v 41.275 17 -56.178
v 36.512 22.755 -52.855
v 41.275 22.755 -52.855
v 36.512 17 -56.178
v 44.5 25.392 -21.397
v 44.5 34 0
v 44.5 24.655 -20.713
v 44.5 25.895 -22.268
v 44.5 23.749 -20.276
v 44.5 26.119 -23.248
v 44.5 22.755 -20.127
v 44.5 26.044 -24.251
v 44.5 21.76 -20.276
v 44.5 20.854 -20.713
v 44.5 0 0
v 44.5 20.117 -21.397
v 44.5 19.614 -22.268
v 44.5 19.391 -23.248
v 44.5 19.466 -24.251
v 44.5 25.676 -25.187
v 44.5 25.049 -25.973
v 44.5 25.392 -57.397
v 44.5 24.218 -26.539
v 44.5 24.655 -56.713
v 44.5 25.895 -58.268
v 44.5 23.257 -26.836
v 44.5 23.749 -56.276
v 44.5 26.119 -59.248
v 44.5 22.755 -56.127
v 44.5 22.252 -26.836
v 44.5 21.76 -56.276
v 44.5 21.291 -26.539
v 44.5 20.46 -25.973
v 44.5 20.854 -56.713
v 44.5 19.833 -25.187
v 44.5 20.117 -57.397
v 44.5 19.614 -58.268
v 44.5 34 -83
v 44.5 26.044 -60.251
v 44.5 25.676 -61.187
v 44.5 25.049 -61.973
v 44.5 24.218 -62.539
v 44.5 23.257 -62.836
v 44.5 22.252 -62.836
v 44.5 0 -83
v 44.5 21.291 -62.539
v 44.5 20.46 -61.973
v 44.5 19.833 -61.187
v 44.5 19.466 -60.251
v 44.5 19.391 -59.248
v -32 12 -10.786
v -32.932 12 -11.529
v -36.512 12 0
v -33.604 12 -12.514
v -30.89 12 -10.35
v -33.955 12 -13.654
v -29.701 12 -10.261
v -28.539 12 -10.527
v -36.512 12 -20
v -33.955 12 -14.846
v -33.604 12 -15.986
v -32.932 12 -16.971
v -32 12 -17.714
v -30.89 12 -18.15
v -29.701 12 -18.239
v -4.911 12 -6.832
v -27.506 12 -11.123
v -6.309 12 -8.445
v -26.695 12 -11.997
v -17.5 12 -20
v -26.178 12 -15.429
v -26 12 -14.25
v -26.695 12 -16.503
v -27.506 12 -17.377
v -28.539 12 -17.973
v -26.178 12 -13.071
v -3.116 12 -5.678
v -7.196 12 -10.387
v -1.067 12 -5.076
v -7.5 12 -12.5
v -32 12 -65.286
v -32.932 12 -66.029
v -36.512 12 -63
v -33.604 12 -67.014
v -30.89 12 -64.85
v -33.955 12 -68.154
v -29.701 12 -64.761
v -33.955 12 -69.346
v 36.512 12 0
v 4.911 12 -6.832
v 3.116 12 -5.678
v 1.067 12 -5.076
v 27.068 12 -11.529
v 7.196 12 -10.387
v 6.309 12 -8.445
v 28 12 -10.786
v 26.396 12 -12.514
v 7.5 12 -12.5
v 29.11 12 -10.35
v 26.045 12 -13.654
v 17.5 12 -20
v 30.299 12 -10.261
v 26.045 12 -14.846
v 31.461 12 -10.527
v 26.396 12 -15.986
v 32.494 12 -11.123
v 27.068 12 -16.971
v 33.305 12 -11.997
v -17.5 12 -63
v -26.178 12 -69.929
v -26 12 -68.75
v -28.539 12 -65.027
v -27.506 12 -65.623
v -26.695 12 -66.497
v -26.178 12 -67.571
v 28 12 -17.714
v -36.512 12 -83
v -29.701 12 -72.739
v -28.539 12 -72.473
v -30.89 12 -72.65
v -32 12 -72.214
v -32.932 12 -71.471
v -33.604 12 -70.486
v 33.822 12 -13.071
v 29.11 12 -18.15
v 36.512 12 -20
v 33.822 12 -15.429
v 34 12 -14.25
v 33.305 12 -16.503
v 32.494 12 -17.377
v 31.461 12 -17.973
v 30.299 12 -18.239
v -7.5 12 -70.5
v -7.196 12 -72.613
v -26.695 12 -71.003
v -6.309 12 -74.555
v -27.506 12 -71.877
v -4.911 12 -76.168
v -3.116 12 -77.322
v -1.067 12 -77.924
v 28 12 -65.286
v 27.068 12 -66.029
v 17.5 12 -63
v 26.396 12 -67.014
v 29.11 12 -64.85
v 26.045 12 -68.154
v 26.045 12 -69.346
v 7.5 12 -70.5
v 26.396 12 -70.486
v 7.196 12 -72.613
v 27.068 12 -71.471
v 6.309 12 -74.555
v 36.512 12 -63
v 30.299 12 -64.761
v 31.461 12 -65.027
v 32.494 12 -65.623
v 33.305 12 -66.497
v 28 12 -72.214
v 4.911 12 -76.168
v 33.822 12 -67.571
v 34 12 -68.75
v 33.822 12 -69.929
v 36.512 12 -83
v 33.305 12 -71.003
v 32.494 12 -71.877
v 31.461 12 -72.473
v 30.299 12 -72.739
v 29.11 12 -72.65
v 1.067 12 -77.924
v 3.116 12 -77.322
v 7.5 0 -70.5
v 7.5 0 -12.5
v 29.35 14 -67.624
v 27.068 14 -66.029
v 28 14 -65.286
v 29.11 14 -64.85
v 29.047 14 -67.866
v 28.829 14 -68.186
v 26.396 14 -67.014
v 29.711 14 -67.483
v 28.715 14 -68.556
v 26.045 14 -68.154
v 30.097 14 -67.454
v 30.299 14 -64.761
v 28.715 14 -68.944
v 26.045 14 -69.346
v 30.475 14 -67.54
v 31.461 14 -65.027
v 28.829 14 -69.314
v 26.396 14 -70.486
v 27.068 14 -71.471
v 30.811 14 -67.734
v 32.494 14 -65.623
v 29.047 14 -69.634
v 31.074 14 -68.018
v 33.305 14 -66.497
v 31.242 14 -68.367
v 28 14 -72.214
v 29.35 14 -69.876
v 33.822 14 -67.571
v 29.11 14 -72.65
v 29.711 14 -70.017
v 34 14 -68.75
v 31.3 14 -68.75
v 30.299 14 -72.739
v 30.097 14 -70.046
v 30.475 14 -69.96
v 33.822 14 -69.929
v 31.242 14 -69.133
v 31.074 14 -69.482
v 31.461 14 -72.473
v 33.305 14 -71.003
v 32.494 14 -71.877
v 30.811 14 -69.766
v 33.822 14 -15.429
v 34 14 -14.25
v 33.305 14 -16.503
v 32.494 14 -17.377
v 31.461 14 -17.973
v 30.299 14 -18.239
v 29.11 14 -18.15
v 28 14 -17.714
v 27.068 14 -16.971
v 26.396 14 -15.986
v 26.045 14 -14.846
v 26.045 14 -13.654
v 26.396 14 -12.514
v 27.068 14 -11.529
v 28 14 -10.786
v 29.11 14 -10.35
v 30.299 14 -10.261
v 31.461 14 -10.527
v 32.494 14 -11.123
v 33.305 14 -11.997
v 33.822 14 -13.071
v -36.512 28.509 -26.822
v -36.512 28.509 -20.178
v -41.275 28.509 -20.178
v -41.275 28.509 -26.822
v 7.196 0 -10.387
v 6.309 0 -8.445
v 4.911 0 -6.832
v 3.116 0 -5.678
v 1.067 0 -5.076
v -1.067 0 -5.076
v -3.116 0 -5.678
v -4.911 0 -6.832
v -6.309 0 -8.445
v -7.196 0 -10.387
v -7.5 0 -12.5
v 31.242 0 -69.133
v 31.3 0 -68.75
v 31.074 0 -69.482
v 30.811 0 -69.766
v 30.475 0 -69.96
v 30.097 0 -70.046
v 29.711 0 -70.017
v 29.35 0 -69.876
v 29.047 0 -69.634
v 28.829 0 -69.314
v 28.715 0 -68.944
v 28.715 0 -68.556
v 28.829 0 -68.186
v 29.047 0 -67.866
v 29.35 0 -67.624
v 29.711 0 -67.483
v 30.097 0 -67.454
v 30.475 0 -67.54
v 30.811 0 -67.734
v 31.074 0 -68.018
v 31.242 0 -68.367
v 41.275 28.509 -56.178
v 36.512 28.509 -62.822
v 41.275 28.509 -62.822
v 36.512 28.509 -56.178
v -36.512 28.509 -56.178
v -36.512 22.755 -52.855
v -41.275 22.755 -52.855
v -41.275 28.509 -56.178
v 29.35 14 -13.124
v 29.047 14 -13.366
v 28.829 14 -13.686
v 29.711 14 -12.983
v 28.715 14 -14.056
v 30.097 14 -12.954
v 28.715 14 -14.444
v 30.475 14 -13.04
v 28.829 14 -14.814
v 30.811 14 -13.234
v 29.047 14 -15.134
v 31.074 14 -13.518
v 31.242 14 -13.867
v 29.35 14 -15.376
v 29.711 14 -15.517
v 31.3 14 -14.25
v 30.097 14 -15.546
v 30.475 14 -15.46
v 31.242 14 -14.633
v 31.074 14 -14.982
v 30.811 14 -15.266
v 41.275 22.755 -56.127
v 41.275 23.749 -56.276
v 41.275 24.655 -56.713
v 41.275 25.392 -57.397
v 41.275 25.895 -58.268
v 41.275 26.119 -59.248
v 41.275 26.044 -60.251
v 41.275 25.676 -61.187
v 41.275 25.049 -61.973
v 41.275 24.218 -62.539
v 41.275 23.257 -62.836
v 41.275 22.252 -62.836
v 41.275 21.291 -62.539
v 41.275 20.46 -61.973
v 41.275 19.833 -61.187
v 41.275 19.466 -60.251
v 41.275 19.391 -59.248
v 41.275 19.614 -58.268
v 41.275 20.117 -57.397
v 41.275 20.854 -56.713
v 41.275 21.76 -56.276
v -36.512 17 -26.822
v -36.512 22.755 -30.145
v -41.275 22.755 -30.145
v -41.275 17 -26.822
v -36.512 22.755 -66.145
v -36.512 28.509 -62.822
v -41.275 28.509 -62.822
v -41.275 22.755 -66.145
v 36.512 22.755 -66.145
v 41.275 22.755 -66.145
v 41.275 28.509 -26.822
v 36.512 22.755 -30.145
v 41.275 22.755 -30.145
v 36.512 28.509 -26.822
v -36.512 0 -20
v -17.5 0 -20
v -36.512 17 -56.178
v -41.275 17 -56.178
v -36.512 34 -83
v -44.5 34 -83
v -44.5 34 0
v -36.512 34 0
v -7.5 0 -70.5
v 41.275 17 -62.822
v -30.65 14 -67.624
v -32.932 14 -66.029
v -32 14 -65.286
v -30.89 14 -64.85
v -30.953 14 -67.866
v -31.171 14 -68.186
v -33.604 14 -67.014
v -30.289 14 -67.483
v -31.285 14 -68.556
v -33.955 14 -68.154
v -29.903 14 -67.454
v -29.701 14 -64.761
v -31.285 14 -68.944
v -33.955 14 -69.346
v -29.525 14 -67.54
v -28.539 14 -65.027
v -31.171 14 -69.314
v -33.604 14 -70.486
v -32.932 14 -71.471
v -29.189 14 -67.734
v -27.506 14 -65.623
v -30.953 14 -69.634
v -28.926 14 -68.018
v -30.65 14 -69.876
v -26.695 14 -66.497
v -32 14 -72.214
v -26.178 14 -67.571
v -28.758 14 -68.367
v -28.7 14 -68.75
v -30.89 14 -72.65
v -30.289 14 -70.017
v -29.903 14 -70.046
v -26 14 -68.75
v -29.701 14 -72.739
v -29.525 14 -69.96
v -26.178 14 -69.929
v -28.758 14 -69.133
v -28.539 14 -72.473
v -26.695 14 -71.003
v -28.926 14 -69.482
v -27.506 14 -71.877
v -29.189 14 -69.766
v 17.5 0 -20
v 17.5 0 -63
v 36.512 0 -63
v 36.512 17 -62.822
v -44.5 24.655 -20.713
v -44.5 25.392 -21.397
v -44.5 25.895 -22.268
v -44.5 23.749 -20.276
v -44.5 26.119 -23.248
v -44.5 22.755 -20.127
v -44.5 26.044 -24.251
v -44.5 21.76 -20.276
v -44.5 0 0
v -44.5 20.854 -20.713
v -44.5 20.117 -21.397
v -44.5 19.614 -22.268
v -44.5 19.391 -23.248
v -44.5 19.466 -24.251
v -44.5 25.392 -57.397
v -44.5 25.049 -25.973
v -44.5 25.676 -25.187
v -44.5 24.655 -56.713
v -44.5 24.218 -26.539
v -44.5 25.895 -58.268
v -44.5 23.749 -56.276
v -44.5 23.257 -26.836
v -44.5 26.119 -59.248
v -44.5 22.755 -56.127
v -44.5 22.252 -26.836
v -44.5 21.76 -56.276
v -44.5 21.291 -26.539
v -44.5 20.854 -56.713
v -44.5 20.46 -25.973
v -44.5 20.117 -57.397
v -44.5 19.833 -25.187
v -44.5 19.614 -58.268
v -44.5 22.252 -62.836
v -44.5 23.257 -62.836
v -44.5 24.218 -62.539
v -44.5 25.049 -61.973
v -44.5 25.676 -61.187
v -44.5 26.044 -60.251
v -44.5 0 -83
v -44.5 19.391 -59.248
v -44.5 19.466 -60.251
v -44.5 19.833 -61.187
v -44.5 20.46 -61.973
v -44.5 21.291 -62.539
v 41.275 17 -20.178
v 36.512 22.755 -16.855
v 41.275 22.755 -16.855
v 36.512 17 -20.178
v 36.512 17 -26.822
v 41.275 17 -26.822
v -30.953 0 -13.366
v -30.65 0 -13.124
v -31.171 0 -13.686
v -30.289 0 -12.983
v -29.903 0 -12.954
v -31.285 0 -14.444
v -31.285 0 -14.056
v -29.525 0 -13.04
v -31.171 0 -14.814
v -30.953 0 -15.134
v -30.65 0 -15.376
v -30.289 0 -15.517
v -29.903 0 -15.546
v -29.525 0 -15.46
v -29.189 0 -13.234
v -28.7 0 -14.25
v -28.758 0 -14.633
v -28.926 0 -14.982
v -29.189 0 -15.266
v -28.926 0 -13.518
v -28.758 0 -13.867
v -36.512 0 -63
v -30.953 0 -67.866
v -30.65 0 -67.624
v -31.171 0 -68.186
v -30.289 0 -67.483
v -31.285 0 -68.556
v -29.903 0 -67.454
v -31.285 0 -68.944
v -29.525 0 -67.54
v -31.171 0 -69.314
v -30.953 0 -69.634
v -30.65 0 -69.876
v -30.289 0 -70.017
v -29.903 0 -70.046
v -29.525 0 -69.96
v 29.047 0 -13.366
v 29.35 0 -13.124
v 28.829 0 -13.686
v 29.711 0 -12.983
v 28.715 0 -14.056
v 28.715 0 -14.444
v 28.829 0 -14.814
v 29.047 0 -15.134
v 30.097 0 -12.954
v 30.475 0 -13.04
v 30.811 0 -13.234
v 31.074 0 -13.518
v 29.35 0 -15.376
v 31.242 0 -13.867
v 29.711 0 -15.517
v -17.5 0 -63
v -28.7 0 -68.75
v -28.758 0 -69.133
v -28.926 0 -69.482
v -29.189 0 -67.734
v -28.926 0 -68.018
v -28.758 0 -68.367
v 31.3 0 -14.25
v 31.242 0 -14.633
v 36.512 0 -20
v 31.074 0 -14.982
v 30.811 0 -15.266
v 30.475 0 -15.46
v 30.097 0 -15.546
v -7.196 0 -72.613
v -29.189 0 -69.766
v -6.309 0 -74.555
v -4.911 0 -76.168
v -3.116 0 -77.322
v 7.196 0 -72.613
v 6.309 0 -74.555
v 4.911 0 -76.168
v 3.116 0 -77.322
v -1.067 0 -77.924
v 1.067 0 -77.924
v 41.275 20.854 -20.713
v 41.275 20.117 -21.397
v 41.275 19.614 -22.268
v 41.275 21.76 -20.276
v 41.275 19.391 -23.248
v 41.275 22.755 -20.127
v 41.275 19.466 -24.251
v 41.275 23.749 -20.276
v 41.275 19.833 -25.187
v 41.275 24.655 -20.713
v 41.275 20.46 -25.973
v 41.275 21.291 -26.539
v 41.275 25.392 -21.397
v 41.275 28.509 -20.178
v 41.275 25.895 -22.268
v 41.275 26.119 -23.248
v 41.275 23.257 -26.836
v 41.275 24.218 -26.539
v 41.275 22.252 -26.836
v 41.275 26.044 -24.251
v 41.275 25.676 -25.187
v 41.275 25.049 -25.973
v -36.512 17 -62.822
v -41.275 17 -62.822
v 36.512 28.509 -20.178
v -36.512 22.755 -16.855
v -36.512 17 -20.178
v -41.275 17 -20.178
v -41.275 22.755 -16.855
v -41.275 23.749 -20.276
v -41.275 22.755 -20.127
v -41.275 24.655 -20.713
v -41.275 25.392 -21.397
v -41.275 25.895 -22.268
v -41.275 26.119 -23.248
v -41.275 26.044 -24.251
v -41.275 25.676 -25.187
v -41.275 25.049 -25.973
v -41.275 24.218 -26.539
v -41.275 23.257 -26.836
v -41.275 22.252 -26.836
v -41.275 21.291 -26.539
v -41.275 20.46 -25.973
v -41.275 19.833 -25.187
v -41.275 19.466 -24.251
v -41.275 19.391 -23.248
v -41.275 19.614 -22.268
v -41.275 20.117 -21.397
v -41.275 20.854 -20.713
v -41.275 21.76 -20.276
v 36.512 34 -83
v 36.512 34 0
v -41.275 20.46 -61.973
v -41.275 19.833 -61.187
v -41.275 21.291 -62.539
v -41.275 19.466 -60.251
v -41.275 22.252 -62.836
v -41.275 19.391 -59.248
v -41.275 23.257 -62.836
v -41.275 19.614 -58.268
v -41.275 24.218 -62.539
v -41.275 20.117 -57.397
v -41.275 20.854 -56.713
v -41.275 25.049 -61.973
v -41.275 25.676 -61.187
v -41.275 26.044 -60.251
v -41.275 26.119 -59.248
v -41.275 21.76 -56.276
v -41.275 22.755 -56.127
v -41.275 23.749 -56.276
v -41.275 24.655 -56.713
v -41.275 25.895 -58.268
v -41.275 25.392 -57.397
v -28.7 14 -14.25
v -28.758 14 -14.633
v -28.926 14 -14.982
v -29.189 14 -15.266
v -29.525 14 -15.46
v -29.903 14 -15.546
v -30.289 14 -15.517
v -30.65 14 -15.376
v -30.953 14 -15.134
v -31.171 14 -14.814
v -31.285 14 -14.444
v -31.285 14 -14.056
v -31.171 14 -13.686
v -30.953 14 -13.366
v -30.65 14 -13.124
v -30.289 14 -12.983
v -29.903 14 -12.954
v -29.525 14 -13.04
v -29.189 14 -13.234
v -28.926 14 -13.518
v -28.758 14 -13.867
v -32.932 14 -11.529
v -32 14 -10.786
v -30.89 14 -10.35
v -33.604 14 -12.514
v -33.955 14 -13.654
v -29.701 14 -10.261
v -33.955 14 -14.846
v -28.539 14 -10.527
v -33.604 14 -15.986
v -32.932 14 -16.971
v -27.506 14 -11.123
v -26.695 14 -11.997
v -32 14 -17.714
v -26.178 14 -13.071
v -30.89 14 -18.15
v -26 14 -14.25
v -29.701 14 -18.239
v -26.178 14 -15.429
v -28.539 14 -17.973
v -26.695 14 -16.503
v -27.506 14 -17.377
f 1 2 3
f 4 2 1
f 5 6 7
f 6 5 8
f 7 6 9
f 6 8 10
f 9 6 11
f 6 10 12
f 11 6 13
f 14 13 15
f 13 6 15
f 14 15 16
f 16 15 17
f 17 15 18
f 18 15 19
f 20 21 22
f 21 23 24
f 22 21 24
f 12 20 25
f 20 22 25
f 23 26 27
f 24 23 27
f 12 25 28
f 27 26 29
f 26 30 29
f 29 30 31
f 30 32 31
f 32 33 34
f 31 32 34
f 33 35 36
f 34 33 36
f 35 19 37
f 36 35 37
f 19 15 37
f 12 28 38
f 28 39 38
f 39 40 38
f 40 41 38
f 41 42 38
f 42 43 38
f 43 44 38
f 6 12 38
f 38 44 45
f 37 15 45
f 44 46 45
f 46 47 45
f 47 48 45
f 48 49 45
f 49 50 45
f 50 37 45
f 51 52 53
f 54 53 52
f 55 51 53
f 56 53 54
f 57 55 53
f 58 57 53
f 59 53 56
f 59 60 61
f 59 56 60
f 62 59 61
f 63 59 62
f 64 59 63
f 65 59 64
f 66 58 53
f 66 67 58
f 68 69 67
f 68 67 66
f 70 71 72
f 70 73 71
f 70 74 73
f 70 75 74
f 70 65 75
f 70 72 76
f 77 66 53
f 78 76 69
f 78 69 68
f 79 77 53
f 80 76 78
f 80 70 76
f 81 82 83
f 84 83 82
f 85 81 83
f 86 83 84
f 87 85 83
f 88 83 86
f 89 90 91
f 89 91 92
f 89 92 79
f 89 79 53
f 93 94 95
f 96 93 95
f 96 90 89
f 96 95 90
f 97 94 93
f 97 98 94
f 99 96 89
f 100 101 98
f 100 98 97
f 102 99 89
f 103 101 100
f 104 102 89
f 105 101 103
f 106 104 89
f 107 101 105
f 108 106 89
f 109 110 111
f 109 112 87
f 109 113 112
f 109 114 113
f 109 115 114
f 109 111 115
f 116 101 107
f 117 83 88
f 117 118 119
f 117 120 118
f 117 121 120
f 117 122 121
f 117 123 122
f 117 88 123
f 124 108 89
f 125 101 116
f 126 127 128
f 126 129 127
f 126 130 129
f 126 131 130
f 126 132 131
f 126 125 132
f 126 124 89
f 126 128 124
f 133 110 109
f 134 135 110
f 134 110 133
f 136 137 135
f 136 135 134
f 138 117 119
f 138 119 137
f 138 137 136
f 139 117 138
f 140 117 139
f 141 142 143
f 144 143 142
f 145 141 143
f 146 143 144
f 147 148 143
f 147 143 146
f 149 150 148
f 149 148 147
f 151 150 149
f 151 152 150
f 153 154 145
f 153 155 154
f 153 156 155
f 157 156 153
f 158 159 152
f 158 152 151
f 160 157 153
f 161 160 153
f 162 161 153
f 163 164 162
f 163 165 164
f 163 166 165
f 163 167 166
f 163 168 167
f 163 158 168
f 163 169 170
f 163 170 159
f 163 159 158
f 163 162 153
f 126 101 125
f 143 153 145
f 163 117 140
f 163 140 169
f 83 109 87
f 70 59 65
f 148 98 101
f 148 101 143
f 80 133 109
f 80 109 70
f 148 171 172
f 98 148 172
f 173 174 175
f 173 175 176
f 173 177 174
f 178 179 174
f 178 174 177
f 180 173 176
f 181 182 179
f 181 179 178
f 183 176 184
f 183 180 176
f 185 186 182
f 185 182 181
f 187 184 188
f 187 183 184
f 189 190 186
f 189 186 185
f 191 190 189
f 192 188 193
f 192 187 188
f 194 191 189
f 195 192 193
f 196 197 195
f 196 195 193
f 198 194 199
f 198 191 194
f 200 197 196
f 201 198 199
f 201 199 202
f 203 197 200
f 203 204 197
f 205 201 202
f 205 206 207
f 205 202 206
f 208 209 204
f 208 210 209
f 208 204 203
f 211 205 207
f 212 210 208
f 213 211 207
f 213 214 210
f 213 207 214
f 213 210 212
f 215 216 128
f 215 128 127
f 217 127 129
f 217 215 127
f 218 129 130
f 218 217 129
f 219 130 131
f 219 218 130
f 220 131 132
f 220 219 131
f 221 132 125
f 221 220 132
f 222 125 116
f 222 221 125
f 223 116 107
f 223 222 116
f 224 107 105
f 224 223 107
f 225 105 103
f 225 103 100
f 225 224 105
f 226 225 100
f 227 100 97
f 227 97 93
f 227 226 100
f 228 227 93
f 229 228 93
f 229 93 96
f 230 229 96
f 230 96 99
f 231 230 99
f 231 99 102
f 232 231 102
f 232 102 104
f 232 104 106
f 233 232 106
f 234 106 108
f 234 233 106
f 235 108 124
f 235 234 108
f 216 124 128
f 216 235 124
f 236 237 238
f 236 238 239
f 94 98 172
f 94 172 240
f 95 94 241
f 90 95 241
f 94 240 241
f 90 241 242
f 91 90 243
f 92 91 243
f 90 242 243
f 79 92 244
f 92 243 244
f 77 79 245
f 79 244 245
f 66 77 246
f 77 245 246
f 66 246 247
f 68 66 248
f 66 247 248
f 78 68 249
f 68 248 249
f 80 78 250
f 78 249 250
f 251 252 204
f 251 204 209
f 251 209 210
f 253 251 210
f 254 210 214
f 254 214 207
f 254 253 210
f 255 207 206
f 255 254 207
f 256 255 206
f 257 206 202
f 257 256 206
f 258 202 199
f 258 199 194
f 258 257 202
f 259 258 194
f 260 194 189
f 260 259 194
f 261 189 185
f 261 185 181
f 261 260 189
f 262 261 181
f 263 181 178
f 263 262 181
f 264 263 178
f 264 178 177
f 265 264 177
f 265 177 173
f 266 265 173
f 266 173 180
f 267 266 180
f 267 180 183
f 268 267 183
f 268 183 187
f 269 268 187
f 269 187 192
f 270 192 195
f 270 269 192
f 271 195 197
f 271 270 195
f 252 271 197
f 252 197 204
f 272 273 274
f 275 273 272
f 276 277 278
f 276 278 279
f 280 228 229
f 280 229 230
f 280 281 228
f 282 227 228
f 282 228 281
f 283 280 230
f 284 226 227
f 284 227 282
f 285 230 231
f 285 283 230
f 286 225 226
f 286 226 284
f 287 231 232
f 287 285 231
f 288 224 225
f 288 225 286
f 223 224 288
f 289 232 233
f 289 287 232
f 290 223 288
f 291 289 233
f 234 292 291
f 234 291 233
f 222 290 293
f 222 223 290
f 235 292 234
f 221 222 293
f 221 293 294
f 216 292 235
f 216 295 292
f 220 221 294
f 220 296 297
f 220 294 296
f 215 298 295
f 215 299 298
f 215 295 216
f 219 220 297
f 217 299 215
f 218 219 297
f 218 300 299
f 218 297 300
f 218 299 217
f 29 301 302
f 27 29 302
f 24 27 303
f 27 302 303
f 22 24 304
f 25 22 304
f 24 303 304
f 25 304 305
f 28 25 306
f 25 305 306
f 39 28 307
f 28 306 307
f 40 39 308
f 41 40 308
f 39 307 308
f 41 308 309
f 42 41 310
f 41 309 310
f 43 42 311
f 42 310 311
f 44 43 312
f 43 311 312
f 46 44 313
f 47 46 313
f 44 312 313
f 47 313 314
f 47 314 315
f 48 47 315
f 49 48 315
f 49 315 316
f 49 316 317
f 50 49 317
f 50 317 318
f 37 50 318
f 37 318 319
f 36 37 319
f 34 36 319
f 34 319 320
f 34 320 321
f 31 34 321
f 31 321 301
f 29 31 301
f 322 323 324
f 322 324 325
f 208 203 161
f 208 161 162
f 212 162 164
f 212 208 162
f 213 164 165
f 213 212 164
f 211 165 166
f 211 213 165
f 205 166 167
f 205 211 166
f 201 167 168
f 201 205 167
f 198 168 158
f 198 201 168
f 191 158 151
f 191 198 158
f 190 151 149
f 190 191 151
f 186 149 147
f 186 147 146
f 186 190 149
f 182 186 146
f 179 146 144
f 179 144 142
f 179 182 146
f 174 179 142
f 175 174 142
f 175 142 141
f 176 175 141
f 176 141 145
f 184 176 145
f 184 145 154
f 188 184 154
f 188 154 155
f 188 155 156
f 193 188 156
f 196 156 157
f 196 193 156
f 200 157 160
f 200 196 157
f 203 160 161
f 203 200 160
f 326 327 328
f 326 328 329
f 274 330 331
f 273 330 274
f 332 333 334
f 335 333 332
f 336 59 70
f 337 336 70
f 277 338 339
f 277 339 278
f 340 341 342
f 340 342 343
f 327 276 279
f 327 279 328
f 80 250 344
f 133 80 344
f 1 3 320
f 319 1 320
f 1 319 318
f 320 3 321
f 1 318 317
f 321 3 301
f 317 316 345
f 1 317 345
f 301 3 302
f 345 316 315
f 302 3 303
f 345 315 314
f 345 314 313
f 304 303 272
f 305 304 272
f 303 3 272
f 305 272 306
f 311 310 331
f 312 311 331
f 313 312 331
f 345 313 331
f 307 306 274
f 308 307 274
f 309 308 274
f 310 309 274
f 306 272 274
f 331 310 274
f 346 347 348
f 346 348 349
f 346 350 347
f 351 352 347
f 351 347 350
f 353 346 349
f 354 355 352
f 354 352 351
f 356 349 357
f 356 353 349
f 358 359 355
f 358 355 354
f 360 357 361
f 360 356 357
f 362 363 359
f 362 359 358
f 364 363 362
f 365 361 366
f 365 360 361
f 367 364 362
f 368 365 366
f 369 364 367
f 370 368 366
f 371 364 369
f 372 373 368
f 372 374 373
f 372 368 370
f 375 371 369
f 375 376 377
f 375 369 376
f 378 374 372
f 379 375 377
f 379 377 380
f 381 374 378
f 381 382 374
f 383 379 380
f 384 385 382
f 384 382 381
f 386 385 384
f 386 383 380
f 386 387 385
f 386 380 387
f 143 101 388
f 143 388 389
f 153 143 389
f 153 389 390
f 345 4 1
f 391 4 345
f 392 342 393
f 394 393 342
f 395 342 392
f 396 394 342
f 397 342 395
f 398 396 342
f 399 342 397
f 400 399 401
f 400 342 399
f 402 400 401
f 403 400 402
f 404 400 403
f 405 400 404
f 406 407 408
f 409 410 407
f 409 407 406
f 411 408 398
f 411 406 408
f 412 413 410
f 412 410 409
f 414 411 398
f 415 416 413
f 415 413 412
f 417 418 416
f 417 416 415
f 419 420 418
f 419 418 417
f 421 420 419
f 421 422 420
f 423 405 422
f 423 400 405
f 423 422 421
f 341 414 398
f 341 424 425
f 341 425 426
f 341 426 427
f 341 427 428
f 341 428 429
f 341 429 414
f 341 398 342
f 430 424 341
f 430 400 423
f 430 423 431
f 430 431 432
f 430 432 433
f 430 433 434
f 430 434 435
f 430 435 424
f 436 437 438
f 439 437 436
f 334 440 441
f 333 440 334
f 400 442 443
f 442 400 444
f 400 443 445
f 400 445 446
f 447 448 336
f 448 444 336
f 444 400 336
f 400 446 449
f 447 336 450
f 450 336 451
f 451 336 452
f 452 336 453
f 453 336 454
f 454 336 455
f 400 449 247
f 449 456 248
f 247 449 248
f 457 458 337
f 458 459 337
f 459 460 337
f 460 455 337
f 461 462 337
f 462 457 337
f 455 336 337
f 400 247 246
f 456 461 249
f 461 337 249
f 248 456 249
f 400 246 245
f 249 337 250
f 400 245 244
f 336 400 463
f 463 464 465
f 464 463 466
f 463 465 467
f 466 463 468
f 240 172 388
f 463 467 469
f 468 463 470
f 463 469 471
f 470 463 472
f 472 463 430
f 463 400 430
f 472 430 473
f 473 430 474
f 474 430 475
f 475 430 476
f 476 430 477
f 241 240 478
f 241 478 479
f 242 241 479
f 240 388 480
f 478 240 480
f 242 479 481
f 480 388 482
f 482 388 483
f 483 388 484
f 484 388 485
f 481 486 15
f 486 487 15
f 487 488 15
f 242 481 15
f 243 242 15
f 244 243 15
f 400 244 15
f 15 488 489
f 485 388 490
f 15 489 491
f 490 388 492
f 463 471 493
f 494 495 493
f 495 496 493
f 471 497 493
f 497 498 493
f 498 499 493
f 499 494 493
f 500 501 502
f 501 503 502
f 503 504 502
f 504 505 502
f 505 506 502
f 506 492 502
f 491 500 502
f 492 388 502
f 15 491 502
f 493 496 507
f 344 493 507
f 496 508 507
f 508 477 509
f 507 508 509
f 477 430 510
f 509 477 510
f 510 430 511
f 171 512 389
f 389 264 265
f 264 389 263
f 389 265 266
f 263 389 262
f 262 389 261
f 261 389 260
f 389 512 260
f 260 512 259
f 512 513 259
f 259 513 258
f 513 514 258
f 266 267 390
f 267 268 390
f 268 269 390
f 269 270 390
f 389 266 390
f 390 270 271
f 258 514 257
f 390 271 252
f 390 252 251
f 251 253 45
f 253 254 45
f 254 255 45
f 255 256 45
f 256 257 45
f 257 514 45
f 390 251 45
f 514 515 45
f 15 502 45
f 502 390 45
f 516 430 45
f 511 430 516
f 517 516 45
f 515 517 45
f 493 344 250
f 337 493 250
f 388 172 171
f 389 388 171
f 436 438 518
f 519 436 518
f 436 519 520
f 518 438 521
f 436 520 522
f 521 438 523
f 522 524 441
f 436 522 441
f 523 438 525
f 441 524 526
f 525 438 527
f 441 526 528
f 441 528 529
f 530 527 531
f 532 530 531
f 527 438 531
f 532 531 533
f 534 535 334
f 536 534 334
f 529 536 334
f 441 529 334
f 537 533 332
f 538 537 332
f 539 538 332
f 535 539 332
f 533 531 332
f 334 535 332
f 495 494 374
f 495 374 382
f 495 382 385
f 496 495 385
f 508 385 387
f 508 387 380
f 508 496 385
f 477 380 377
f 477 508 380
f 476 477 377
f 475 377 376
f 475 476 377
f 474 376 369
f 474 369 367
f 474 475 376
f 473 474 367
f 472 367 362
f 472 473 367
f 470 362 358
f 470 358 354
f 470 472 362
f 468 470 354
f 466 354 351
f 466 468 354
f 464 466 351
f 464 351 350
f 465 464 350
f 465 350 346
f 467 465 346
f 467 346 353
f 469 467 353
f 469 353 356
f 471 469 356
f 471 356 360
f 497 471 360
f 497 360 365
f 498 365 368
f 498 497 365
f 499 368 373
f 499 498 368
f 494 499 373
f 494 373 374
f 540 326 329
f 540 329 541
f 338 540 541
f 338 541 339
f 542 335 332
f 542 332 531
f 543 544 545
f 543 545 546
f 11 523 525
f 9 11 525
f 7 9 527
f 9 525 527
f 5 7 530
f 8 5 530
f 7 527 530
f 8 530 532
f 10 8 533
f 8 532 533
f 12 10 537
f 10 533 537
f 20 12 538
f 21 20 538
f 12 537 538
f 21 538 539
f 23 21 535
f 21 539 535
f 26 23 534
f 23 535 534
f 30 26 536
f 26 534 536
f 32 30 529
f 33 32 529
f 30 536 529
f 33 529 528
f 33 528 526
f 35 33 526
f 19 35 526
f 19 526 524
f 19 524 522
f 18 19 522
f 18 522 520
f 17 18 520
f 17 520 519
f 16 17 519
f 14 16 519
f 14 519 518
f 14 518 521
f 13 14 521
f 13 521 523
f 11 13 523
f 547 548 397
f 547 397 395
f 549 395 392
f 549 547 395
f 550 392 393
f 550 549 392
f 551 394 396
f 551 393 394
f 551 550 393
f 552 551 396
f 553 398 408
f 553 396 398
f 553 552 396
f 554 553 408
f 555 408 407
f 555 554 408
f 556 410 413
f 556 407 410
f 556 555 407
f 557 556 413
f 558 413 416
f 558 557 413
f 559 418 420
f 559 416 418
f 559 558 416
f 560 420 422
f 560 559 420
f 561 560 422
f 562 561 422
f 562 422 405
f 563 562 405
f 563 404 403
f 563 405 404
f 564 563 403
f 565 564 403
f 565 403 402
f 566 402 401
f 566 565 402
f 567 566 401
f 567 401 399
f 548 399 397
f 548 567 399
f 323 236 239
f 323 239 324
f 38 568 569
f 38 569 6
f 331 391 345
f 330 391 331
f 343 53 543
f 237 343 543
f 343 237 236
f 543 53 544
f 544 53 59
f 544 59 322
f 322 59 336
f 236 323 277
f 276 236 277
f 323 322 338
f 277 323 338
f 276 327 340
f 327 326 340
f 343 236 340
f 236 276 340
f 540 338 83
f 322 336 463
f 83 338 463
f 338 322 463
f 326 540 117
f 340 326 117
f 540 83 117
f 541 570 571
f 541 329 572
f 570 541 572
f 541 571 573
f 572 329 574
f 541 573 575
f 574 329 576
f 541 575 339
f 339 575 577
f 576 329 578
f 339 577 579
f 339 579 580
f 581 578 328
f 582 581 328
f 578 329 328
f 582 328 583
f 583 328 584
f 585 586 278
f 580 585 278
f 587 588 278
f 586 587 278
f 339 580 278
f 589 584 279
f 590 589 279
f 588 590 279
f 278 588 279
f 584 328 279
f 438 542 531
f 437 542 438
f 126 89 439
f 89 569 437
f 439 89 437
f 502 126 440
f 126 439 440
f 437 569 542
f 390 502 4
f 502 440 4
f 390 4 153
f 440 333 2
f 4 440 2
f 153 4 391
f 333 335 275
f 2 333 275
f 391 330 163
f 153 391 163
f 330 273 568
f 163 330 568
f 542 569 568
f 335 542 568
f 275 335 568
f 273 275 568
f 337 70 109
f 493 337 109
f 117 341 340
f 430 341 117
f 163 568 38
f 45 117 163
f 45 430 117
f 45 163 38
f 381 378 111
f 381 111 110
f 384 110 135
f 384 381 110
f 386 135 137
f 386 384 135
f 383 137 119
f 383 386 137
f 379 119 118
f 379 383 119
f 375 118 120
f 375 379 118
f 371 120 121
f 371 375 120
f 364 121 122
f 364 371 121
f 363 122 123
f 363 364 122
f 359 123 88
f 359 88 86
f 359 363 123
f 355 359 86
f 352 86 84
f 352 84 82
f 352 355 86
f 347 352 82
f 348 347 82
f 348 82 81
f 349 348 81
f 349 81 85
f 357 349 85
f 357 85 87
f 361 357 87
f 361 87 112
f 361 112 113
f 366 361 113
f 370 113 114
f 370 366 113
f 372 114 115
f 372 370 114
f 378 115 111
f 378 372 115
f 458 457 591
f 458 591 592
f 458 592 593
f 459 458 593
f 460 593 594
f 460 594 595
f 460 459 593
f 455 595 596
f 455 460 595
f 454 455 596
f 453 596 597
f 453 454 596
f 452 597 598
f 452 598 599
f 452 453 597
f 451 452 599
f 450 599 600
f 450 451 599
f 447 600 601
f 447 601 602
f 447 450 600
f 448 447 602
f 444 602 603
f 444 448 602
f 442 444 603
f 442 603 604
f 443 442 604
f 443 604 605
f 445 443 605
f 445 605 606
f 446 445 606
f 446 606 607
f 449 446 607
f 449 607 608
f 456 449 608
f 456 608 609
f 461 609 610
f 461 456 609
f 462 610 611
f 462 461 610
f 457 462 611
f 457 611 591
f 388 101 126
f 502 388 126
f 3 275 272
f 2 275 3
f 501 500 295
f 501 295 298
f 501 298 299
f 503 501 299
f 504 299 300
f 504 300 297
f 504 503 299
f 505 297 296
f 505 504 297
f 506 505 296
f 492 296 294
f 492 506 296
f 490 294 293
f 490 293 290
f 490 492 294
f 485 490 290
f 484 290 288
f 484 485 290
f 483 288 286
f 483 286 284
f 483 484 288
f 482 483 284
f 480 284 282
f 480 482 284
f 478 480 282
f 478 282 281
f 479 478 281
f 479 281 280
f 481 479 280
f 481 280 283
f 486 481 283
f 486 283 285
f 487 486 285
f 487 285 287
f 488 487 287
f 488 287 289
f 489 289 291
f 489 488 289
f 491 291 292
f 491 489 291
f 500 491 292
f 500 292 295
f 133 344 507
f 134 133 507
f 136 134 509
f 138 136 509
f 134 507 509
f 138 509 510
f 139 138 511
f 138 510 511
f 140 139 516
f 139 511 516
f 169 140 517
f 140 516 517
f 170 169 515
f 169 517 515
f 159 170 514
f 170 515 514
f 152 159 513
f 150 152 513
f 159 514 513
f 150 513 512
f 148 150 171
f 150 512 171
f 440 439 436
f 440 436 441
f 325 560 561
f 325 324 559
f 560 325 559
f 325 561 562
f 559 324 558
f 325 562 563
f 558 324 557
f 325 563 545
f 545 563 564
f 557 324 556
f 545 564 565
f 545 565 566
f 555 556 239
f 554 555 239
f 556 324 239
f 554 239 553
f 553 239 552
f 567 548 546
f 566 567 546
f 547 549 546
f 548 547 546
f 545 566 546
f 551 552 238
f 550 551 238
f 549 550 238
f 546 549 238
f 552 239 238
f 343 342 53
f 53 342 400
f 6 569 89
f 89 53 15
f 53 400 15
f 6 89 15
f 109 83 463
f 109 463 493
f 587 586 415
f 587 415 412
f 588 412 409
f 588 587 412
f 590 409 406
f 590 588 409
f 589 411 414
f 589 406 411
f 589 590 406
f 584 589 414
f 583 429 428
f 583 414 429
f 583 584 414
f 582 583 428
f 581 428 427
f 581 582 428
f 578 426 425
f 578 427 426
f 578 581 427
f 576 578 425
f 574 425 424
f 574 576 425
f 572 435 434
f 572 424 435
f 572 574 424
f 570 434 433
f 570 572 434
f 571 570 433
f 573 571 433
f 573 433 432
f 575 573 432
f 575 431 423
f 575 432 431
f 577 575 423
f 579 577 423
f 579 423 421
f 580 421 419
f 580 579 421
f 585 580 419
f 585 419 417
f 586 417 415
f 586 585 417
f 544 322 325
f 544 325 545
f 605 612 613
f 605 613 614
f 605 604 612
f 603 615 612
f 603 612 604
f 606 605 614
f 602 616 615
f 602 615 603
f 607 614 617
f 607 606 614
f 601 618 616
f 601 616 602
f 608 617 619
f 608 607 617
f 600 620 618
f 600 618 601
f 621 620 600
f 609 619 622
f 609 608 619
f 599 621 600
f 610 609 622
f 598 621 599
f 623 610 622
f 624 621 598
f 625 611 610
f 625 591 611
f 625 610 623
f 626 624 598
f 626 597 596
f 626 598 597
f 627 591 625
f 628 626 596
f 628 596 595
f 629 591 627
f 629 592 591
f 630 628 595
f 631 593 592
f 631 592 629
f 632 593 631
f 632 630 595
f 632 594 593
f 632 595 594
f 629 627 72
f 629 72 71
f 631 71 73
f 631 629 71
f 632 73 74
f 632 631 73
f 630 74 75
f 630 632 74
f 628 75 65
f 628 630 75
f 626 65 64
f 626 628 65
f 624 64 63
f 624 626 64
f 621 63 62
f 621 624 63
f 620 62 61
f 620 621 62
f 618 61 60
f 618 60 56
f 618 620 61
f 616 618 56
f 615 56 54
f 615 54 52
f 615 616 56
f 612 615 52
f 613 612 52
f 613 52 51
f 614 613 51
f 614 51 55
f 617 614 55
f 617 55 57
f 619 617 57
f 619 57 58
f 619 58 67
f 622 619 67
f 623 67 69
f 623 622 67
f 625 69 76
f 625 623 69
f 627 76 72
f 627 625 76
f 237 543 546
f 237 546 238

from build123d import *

# Parameters (mm, degrees)
SKETCH1_W                   = 89
SKETCH1_H                   = 83
SKETCH1_R                   = 1.3
MAIN_BODY_DEPTH             = 14
SKETCH2_W                   = 73.025
SKETCH2_H                   = 83
SKETCH2_R                   = 4
SCREW_RISER_DEPTH           = 2
SKETCH4_W                   = 7.9875
SKETCH4_H                   = 83
TOPPER_SUPPORT_DEPTH        = 20
MOUNT_START                 = -44.5
MOUNT_NUTS_DEPTH            = 41.275
F_9_32_MOUNT_HOLES_REACH    = 9.988
SKETCH5_R                   = 3.3734375
SKETCH8_W                   = 19.0125
SKETCH8_H                   = 43
MIDDLE_CUT_DEPTH            = 14
SKETCH9_R                   = 3.3734375
MOUNT_NUTS_P2_DEPTH         = 4.7625
SKETCH9_3_R                 = 3.3734375
F_9_32_MOUNT_HOLES_P2_DEPTH = 7.9875


with BuildPart() as part:
    # Sketch1 → Main Body (new body)
    with BuildSketch(Plane(origin=(0, 0, 0), x_dir=(1, 0, 0), z_dir=(0, 1, 0))):
        with Locations((0, 41.5)):
            Rectangle(SKETCH1_W, SKETCH1_H)
        with Locations((-30, 14.25)):
            Circle(SKETCH1_R, mode=Mode.SUBTRACT)
        with Locations((30, 14.25)):
            Circle(SKETCH1_R, mode=Mode.SUBTRACT)
        with BuildLine():
            Line((-7.5, 12.5), (-7.5, 70.5))
            ThreePointArc((-7.5, 70.5), (0, 78), (7.5, 70.5))
            Line((7.5, 70.5), (7.5, 12.5))
            ThreePointArc((7.5, 12.5), (0, 5), (-7.5, 12.5))
        make_face(mode=Mode.SUBTRACT)
        with Locations((-30, 68.75)):
            Circle(SKETCH1_R, mode=Mode.SUBTRACT)
        with Locations((30, 68.75)):
            Circle(SKETCH1_R, mode=Mode.SUBTRACT)
    extrude(amount=MAIN_BODY_DEPTH)

    # Sketch2 → Screw Riser (cut)
    with BuildSketch(Plane(origin=(0, 14, 0), x_dir=(1, 0, 0), z_dir=(0, 1, 0))):
        with Locations((0, 41.5)):
            Rectangle(SKETCH2_W, SKETCH2_H)
        with Locations((-30, 14.25)):
            Circle(SKETCH2_R, mode=Mode.SUBTRACT)
        with Locations((30, 14.25)):
            Circle(SKETCH2_R, mode=Mode.SUBTRACT)
        with Locations((-30, 68.75)):
            Circle(SKETCH2_R, mode=Mode.SUBTRACT)
        with Locations((30, 68.75)):
            Circle(SKETCH2_R, mode=Mode.SUBTRACT)
    extrude(amount=-SCREW_RISER_DEPTH, mode=Mode.SUBTRACT)

    # Sketch4 → Topper Support (add)
    with BuildSketch(Plane(origin=(0, 14, 0), x_dir=(1, 0, 0), z_dir=(0, 1, 0))):
        with Locations((-40.50625, 41.5)):
            Rectangle(SKETCH4_W, SKETCH4_H)
        with Locations((40.50625, 41.5)):
            Rectangle(SKETCH4_W, SKETCH4_H)
    extrude(amount=TOPPER_SUPPORT_DEPTH)

    # Sketch6 → Mount Nuts (cut)
    with BuildSketch(Plane.ZY.offset(44.5).offset(MOUNT_START)):
        Polygon((-52.855059246, 22.7546875), (-56.177529623, 28.509375), (-62.822470377, 28.509375), (-66.144940754, 22.7546875), (-62.822470377, 17), (-56.177529623, 17), align=None)
        Polygon((-16.855059246, 22.7546875), (-20.177529623, 28.509375), (-26.822470377, 28.509375), (-30.144940754, 22.7546875), (-26.822470377, 17), (-20.177529623, 17), align=None)
    extrude(amount=MOUNT_NUTS_DEPTH, mode=Mode.SUBTRACT)

    # Sketch5 → 9/32 Mount Holes (cut, up to next)
    with BuildSketch(Plane.ZY.offset(36.5125), mode=Mode.PRIVATE) as f_9_32_mount_holes_sk1:
        with Locations((-59.5, 22.7546875)):
            Circle(SKETCH5_R)
    f_9_32_mount_holes_tool1 = extrude(f_9_32_mount_holes_sk1.sketch, amount=F_9_32_MOUNT_HOLES_REACH, mode=Mode.PRIVATE) & part.part
    add(f_9_32_mount_holes_tool1.solids().sort_by_distance((-36.5125, 22.754688, -59.5))[0], mode=Mode.SUBTRACT)
    # Sketch5 → 9/32 Mount Holes (cut, up to next)
    with BuildSketch(Plane.ZY.offset(36.5125), mode=Mode.PRIVATE) as f_9_32_mount_holes_sk2:
        with Locations((-23.5, 22.7546875)):
            Circle(SKETCH5_R)
    f_9_32_mount_holes_tool2 = extrude(f_9_32_mount_holes_sk2.sketch, amount=F_9_32_MOUNT_HOLES_REACH, mode=Mode.PRIVATE) & part.part
    add(f_9_32_mount_holes_tool2.solids().sort_by_distance((-36.5125, 22.754688, -23.5))[0], mode=Mode.SUBTRACT)

    # Sketch8 → Middle Cut (cut)
    with BuildSketch(Plane(origin=(0, 14, 0), x_dir=(1, 0, 0), z_dir=(0, 1, 0))):
        with Locations((-27.00625, 41.5)):
            Rectangle(SKETCH8_W, SKETCH8_H)
        with Locations((27.00625, 41.5)):
            Rectangle(SKETCH8_W, SKETCH8_H)
    extrude(amount=-MIDDLE_CUT_DEPTH, mode=Mode.SUBTRACT)

    # Sketch9 → Mount Nuts p2 (cut)
    with BuildSketch(Plane.ZY.offset(-36.5125)):
        Polygon((-56.177529623, 17), (-62.822470377, 17), (-66.144940754, 22.7546875), (-62.822470377, 28.509375), (-56.177529623, 28.509375), (-52.855059246, 22.7546875), align=None)
        with Locations((-59.5, 22.7546875)):
            Circle(SKETCH9_R, mode=Mode.SUBTRACT)
        with Locations((-59.5, 22.7546875)):
            Circle(SKETCH9_R)
        Polygon((-20.177529623, 17), (-26.822470377, 17), (-30.144940754, 22.7546875), (-26.822470377, 28.509375), (-20.177529623, 28.509375), (-16.855059246, 22.7546875), align=None)
        with Locations((-23.5, 22.7546875)):
            Circle(SKETCH9_R, mode=Mode.SUBTRACT)
        with Locations((-23.5, 22.7546875)):
            Circle(SKETCH9_R)
    extrude(amount=-MOUNT_NUTS_P2_DEPTH, mode=Mode.SUBTRACT)

    # Sketch9<3> → 9/32 Mount Holes p2 (cut)
    with BuildSketch(Plane.ZY.offset(-36.5125)):
        with Locations((-59.5, 22.7546875)):
            Circle(SKETCH9_3_R)
        with Locations((-23.5, 22.7546875)):
            Circle(SKETCH9_3_R)
    extrude(amount=-F_9_32_MOUNT_HOLES_P2_DEPTH, mode=Mode.SUBTRACT)


solid = part.part
